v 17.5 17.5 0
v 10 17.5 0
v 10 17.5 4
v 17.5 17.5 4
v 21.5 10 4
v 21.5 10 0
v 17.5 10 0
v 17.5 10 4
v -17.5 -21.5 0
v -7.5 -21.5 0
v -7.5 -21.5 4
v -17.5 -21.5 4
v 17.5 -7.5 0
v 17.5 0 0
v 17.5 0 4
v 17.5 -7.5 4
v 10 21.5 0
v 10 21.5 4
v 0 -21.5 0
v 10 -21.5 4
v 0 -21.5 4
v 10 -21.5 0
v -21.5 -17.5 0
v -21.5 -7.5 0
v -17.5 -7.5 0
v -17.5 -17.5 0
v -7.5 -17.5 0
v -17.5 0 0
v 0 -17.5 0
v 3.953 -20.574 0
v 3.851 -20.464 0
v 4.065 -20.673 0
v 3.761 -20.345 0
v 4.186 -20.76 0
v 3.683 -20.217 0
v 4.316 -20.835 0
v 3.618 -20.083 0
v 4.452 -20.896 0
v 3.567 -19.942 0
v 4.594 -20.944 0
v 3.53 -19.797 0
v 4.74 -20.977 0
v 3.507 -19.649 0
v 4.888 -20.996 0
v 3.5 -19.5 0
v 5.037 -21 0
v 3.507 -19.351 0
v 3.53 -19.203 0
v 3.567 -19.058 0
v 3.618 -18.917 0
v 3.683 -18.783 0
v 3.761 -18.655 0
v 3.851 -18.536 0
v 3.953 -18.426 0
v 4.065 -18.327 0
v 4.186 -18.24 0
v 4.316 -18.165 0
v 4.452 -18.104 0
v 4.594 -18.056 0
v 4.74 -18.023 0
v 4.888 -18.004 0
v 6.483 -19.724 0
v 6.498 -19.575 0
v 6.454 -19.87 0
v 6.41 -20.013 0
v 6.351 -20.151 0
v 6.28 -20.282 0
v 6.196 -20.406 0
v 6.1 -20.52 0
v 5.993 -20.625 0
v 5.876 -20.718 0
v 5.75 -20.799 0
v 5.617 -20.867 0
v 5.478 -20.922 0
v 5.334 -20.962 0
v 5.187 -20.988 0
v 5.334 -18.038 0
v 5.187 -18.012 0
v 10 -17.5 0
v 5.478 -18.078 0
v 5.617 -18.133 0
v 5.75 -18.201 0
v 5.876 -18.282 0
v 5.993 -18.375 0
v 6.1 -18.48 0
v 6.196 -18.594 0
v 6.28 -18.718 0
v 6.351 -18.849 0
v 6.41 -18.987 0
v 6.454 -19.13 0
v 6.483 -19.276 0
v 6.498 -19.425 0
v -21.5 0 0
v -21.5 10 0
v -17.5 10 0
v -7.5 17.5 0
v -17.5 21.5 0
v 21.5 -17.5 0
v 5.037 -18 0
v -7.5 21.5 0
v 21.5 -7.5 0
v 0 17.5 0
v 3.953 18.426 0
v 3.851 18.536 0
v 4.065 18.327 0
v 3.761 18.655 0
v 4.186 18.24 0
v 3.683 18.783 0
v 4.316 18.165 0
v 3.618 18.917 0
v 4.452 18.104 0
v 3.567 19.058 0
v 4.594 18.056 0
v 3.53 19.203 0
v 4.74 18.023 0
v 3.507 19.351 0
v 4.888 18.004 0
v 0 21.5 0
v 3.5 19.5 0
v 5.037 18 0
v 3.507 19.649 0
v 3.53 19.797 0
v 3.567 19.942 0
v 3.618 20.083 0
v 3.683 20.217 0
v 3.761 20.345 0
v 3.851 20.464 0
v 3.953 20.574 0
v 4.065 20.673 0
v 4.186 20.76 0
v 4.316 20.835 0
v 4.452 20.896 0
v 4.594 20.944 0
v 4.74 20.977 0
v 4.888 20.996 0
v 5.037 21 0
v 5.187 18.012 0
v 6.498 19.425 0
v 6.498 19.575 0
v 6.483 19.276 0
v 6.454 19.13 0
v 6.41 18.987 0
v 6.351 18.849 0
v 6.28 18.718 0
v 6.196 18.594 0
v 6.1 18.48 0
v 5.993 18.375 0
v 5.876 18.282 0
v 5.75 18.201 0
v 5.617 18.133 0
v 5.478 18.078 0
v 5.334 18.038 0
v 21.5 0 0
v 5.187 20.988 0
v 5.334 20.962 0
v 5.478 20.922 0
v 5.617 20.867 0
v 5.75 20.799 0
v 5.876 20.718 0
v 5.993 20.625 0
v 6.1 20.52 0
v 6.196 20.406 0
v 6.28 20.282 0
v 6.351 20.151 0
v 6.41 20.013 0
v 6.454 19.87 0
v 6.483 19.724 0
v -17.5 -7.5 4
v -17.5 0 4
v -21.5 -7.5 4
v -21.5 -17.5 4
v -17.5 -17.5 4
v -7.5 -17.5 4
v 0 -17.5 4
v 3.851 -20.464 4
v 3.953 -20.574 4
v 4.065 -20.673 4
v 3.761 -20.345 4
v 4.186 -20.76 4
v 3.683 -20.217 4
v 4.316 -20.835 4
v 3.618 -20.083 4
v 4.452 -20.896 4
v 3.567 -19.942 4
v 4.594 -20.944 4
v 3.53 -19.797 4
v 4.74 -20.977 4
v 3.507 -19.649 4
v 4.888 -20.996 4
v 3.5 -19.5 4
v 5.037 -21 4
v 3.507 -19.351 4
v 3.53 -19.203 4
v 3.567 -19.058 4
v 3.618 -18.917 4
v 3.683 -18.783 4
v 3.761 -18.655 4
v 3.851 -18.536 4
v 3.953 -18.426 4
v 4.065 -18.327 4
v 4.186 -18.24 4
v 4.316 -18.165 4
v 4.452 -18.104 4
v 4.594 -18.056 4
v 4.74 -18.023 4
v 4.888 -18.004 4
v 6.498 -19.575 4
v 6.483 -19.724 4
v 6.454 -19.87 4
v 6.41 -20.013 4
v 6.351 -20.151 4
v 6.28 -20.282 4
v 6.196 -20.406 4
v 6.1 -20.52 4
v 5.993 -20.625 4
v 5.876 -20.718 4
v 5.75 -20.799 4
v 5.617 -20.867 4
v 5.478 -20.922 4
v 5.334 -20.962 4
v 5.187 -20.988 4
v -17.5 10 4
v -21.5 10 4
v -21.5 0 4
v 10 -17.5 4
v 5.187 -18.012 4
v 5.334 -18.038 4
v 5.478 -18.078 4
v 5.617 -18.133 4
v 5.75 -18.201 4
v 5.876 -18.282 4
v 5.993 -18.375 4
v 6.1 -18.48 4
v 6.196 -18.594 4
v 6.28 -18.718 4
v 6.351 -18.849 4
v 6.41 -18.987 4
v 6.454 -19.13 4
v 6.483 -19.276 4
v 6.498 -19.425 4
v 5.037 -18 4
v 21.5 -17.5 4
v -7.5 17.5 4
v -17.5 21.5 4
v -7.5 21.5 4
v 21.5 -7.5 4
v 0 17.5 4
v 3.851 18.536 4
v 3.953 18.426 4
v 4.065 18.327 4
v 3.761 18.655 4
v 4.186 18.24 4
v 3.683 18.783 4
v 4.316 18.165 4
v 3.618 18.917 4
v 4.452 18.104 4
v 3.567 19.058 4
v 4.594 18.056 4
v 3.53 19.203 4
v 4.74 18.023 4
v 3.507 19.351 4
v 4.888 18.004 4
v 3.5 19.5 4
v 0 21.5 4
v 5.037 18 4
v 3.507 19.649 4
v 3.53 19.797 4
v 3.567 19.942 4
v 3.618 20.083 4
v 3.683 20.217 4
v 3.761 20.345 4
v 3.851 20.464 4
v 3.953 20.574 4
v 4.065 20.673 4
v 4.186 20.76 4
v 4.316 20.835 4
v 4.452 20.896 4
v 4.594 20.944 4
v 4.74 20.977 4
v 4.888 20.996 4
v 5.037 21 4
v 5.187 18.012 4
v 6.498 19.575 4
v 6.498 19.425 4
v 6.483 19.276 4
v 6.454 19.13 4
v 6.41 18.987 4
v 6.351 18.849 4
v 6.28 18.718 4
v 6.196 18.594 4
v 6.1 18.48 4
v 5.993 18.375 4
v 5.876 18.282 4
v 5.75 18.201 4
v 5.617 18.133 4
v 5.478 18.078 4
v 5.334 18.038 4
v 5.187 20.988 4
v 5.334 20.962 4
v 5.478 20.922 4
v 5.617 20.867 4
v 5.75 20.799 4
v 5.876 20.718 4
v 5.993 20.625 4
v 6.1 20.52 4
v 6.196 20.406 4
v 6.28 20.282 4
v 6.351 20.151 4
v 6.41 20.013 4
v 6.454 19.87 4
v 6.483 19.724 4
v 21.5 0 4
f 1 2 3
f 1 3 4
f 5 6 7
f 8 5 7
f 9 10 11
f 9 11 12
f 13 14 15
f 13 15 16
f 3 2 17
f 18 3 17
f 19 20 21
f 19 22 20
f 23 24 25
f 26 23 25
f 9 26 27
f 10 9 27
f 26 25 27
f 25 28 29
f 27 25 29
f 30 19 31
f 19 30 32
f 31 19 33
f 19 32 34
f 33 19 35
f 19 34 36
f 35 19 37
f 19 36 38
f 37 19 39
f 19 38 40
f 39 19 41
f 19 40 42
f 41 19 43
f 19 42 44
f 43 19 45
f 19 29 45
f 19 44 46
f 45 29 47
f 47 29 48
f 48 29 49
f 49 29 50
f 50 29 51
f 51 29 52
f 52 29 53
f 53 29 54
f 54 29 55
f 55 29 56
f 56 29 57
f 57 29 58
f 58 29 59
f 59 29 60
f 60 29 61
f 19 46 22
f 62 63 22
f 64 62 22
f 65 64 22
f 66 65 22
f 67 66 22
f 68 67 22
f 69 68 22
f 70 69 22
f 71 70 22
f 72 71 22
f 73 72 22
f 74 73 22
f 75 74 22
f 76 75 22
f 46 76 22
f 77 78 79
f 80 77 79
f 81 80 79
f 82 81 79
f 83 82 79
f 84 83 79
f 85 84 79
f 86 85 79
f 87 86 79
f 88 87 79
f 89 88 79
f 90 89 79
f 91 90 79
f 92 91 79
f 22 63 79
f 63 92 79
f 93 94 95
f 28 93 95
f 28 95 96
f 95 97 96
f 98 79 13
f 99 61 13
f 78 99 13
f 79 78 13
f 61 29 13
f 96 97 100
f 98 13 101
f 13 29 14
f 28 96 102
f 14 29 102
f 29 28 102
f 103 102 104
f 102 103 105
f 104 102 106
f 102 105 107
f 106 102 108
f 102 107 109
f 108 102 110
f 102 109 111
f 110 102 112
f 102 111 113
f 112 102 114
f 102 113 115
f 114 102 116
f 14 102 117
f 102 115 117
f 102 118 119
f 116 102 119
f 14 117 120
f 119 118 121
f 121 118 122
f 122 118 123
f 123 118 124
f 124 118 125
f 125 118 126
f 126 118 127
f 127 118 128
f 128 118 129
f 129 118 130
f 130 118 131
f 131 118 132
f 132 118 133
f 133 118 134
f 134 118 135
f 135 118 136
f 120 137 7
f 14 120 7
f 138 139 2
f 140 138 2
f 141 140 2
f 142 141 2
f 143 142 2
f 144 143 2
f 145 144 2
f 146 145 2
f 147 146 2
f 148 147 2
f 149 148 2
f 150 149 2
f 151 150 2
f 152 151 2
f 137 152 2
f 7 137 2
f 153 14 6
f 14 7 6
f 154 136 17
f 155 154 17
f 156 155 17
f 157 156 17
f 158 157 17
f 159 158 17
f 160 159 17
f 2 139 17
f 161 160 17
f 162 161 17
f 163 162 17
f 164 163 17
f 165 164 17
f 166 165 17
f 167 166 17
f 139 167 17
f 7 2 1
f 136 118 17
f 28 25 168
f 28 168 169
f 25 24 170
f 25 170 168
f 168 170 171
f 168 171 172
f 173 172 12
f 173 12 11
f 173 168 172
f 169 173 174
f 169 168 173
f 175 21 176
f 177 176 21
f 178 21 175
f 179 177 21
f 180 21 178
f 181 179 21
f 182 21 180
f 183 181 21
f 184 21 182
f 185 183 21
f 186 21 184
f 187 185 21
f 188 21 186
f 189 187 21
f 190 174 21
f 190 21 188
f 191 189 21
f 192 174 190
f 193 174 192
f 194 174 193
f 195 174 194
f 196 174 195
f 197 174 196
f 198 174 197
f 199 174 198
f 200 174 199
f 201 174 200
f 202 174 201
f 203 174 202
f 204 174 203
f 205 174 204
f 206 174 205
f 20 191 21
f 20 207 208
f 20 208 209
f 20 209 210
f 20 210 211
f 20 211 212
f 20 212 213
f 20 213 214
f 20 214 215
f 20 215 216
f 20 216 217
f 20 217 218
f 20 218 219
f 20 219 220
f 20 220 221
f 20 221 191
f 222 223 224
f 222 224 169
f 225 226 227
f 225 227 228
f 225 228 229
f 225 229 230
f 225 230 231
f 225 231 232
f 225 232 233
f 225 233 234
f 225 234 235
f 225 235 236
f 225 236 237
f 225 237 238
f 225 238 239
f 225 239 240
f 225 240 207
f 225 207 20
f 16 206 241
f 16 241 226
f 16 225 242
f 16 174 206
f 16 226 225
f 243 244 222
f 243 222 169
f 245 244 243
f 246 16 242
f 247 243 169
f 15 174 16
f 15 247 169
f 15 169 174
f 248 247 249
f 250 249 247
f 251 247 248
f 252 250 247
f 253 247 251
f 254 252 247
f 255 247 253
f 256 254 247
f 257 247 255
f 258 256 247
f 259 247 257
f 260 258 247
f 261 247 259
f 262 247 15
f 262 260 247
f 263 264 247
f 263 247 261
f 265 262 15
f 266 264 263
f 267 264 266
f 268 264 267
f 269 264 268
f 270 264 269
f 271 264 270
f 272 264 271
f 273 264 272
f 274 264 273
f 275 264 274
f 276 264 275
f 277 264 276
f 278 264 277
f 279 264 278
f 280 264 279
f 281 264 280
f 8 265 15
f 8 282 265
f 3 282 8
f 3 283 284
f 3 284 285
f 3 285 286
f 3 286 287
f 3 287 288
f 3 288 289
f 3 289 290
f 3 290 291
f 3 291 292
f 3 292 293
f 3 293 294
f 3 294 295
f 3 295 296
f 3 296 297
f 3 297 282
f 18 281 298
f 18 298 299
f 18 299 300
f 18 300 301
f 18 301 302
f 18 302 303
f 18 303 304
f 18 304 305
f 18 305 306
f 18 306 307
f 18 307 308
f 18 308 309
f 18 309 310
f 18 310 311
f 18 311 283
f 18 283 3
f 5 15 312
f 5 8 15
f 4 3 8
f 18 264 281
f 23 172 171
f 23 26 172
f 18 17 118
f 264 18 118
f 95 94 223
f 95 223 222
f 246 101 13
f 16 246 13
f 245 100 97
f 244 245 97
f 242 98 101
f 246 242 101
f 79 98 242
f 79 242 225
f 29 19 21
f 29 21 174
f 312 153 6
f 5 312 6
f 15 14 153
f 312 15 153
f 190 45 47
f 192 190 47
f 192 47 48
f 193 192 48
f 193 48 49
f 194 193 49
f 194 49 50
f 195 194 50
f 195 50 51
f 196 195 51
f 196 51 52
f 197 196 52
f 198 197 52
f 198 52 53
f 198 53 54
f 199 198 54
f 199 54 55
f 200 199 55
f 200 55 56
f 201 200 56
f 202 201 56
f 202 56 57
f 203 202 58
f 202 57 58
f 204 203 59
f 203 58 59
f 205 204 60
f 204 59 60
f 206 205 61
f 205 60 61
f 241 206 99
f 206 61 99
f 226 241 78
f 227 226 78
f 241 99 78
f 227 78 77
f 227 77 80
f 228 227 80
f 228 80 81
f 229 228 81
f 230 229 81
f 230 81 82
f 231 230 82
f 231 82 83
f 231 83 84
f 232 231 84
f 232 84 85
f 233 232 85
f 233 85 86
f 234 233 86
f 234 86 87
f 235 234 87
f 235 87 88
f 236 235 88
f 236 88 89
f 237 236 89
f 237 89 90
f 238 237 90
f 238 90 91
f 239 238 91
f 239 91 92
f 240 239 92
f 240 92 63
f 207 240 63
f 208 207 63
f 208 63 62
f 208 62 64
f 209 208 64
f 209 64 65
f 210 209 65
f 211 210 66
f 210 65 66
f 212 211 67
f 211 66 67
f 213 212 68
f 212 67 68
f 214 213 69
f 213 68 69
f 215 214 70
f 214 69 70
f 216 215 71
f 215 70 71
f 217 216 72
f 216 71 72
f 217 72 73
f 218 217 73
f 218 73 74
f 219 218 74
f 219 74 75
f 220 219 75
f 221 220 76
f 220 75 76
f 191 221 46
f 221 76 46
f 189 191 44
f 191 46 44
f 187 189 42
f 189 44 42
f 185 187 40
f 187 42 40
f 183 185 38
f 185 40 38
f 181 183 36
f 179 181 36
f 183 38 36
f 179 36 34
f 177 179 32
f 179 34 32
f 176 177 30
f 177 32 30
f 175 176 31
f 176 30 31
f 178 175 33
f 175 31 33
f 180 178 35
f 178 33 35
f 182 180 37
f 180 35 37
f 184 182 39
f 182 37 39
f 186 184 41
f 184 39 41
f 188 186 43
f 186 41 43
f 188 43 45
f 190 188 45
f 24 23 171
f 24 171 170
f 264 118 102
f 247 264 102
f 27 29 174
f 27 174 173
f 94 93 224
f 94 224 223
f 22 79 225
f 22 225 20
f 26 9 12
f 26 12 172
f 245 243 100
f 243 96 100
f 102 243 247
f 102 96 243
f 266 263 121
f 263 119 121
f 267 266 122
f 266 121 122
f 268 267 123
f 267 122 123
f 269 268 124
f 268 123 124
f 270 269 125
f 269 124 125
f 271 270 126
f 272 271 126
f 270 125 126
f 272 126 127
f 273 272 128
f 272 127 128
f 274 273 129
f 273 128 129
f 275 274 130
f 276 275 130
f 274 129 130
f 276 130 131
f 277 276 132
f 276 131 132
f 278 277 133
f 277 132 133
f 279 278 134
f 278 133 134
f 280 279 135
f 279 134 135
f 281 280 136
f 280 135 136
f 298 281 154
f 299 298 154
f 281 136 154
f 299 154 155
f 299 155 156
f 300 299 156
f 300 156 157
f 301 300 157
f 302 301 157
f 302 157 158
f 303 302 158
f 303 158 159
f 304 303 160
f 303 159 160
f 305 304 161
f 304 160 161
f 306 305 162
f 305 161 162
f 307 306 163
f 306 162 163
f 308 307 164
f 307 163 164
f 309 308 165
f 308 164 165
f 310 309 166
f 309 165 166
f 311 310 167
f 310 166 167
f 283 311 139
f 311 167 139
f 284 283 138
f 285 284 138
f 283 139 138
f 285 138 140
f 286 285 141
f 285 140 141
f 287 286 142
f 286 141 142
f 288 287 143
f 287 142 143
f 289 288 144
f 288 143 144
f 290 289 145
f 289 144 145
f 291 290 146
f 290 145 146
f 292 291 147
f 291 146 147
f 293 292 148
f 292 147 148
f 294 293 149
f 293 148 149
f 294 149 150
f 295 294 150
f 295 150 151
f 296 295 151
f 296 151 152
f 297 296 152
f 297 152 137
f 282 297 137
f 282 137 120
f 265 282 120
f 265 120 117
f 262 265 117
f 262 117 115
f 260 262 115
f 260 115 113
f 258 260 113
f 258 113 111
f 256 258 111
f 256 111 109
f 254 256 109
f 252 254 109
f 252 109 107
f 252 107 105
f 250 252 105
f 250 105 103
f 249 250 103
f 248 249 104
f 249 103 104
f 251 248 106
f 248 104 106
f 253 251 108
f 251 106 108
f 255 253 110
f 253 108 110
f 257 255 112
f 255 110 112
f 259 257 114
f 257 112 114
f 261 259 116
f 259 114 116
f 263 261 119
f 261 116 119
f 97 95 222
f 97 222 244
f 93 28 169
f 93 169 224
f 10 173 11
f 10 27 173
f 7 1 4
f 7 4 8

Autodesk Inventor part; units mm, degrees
ref_plane "YZ Plane" through (0, 0, 0) normal (1, 0, 0) x (0, 1, 0)
ref_plane "XZ Plane" through (0, 0, 0) normal (0, 1, 0) x (-1, 0, 0)
ref_plane "XY Plane" through (0, 0, 0) normal (0, 0, 1) x (1, 0, 0)
sketch "Sketch1" plane through (0, 0, 0) normal (0, 0, 1) x (1, 0, 0)
  line L0 (17.5, -17.5) -> (0, -17.5)
  line L1 (-17.5, -17.5) -> (-17.5, 17.5)
  line L2 (-17.5, 17.5) -> (-7.5, 17.5) construction
  line L3 (17.5, 17.5) -> (17.5, 10)
  line L4 (17.5, -17.5) -> (-17.5, 17.5) construction
  line L5 (-17.5, -17.5) -> (17.5, 17.5) construction
  line L6 (-17.5, -17.5) -> (-21.5, -17.5)
  line L7 (-21.5, -17.5) -> (-21.5, -7.5)
  line L8 (-21.5, -7.5) -> (-17.5, -7.5)
  line L9 (-17.5, -7.5) -> (-17.5, -17.5) construction
  line L10 (-17.5, 0) -> (-21.5, 0)
  line L11 (-21.5, 0) -> (-21.5, 10)
  line L12 (-21.5, 10) -> (-17.5, 10)
  line L13 (-17.5, 10) -> (-17.5, 0) construction
  line L14 (-17.5, 17.5) -> (-7.5, 17.5) construction
  line L15 (-7.5, 17.5) -> (-7.5, 21.5)
  line L16 (-7.5, 21.5) -> (-17.5, 21.5)
  line L17 (-17.5, 21.5) -> (-17.5, 17.5)
  line L18 (0, 17.5) -> (10, 17.5) construction
  line L19 (10, 17.5) -> (10, 21.5)
  line L20 (10, 21.5) -> (0, 21.5)
  line L21 (0, 21.5) -> (0, 17.5)
  line L22 (-17.5, 0) -> (17.5, 0) construction
  line L23 (0, -17.5) -> (0, 17.5) construction
  line L24 (-17.5, -17.5) -> (-7.5, -17.5)
  line L25 (-7.5, -17.5) -> (-7.5, -21.5)
  line L26 (-7.5, -21.5) -> (-17.5, -21.5)
  line L27 (-17.5, -21.5) -> (-17.5, -17.5)
  line L28 (0, -17.5) -> (10, -17.5) construction
  line L29 (10, -17.5) -> (10, -21.5)
  line L30 (10, -21.5) -> (0, -21.5)
  line L31 (0, -21.5) -> (0, -17.5)
  line L32 (17.5, -17.5) -> (21.5, -17.5)
  line L33 (21.5, -17.5) -> (21.5, -7.5)
  line L34 (21.5, -7.5) -> (17.5, -7.5)
  line L35 (17.5, -7.5) -> (17.5, -17.5) construction
  line L36 (17.5, 0) -> (21.5, 0)
  line L37 (21.5, 0) -> (21.5, 10)
  line L38 (21.5, 10) -> (17.5, 10)
  line L39 (17.5, 10) -> (17.5, 0) construction
  line L40 (-7.5, 17.5) -> (0, 17.5)
  line L41 (0, 17.5) -> (10, 17.5)
  line L42 (17.5, 10) -> (17.5, 0) construction
  line L43 (17.5, 0) -> (17.5, -7.5)
  line L44 (17.5, -7.5) -> (17.5, -17.5) construction
  line L45 (0, -17.5) -> (-17.5, -17.5)
  line L46 (10, 17.5) -> (17.5, 17.5)
  point P0 (0, 0)
  point P1 (0, 19.5)
  point P2 (-7.5, 19.5)
  point P3 (0, -19.5)
  point P4 (-7.5, -19.5)
  point P5 (-17.5, -7.5)
  point P6 (10, -17.5)
  dimension "d5" = 10
  dimension "d6" = 10
  dimension "d7" = 7.5
  dimension "d8" = 4
  dimension "d9" = 10
  dimension "d10" = 4
  dimension "d11" = 10
  dimension "d12" = 4
  dimension "d13" = 7.5
  dimension "d16" = 35
  dimension "d17" = 35
extrude "Extrusion1" add sketch "Sketch1" along normal blind 4
sketch "Sketch2" plane through (0, 0, 0) normal (0, 0, -1) x (-1, 0, 0)
  line L0 (-3.5, 17.5) -> (-6.5, 17.5) construction
  line L1 (-3.5, 21.5) -> (-3.5, 17.5) construction
  line L2 (-6.5, 21.5) -> (-3.5, 21.5) construction
  line L3 (-6.5, 21.5) -> (-6.5, 17.5) construction
  line L4 (-3.5, -21.5) -> (-6.5, -21.5) construction
  line L5 (-3.5, -17.5) -> (-3.5, -21.5) construction
  line L6 (-6.5, -17.5) -> (-3.5, -17.5) construction
  line L7 (-6.5, -17.5) -> (-6.5, -21.5) construction
  line L8 (-6.5, 21.5) -> (-3.5, 17.5) construction
  line L9 (-6.5, -21.5) -> (-3.5, -17.5) construction
  circle A0 centre (-5, 19.5) radius 1.5
  circle A1 centre (-5, -19.5) radius 1.5
  point P0 (0, 0)
  dimension "d18" = 3
extrude "Extrusion2" cut sketch "Sketch2" against normal up to next
properties part number "FloorButtonHolder_Back_V1" material "MDF Medium Density Fiberboard"
